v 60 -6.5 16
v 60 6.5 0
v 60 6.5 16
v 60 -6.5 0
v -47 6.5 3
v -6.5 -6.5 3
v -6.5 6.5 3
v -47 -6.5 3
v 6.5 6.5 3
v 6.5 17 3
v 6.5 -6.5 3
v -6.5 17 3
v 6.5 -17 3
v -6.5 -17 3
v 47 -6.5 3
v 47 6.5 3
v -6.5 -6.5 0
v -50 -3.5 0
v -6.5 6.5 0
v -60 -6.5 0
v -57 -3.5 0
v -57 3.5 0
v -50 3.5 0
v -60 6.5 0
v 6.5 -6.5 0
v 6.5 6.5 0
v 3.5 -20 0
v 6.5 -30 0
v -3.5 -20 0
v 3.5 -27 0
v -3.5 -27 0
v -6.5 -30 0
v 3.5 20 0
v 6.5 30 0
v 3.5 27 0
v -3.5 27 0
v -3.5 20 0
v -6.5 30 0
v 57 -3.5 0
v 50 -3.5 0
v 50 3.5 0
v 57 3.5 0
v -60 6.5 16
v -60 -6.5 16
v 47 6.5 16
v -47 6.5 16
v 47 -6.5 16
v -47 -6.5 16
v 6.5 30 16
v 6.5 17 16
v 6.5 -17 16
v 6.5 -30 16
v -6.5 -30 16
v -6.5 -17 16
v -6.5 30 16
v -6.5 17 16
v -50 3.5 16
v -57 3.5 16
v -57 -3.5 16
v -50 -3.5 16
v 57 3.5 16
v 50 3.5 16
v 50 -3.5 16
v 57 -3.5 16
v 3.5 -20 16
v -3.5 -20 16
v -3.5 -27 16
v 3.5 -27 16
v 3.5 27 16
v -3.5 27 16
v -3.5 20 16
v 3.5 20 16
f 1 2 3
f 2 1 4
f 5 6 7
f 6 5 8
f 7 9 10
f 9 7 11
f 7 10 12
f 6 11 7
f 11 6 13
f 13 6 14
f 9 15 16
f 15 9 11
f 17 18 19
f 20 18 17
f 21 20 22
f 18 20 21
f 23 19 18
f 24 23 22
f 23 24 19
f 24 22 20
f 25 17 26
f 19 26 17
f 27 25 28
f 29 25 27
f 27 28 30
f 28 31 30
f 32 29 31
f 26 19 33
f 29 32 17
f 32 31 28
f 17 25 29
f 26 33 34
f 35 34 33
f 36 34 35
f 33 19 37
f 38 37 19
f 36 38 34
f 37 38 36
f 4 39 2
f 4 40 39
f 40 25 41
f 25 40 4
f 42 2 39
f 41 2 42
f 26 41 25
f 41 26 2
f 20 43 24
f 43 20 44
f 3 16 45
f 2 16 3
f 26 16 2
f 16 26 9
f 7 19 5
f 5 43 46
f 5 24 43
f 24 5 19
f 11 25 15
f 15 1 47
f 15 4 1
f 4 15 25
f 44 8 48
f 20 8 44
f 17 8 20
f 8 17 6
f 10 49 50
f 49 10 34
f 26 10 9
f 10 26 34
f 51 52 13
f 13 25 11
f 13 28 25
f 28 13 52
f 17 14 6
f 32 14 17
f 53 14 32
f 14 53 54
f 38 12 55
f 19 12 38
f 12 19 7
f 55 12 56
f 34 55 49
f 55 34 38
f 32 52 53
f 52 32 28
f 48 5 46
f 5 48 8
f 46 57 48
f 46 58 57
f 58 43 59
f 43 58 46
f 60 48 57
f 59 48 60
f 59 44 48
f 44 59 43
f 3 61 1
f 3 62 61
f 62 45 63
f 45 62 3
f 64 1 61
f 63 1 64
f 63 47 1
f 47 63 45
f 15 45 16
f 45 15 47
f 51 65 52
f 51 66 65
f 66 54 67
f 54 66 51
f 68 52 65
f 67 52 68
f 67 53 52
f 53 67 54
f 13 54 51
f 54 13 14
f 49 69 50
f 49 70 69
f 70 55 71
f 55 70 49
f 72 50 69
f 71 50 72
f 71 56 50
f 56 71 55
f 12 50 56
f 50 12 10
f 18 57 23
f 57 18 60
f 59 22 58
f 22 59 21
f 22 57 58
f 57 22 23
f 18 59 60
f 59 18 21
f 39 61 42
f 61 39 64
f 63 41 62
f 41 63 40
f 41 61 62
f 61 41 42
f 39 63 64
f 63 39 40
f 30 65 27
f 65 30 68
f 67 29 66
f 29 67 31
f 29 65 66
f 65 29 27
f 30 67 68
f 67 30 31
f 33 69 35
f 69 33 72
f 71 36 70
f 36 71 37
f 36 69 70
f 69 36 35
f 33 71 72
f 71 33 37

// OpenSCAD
//
//
//

$length = 120;
$width  =  60;
$height =  16;
$t      =   3;
$hole    =  7;

difference() {
    union() {
        // the cross
        translate( [ -$length/2 , -$hole/2-$t, 0 ] ) {
            cube( [ $length, $hole + 2*$t, $t ] );
        };
        translate( [ -$hole/2-$t, -$width/2, 0 ] ) {
            cube( [ $hole + 2*$t, $width, $t ] );
        };

        // the cubes
        translate( [ -$length/2, -$hole/2-$t, 0 ] ) {
            cube( [ $hole + 2*$t, $hole + 2*$t, $height ] );
        };
        translate( [ $length/2-$hole - 2*$t, -$hole/2-$t, 0 ] ) {
            cube( [ $hole + 2*$t, $hole + 2*$t, $height ] );
        };
        translate( [ -$hole/2-$t, -$width/2, 0 ] ) {
            cube( [ $hole + 2*$t, $hole + 2*$t, $height ] );
        };
        translate( [ -$hole/2-$t, $width/2-$hole-2*$t, 0 ] ) {
            cube( [ $hole + 2*$t, $hole + 2*$t, $height ] );
        };
    };

    translate( [ -$length/2+$t, -$hole/2, -1 ] ) {
        cube( [ $hole, $hole, $height+2 ] );
    };
    translate( [ $length/2-$hole-$t, -$hole/2, -1 ] ) {
        cube( [ $hole, $hole, $height+2 ] );
    };
    translate( [ -$hole/2, -$width/2+$t, -1 ] ) {
        cube( [ $hole, $hole, $height+2 ] );
    };
    translate( [ -$hole/2, $width/2-$hole-$t, -1 ] ) {
        cube( [ $hole, $hole, $height+2 ] );
    };
};
